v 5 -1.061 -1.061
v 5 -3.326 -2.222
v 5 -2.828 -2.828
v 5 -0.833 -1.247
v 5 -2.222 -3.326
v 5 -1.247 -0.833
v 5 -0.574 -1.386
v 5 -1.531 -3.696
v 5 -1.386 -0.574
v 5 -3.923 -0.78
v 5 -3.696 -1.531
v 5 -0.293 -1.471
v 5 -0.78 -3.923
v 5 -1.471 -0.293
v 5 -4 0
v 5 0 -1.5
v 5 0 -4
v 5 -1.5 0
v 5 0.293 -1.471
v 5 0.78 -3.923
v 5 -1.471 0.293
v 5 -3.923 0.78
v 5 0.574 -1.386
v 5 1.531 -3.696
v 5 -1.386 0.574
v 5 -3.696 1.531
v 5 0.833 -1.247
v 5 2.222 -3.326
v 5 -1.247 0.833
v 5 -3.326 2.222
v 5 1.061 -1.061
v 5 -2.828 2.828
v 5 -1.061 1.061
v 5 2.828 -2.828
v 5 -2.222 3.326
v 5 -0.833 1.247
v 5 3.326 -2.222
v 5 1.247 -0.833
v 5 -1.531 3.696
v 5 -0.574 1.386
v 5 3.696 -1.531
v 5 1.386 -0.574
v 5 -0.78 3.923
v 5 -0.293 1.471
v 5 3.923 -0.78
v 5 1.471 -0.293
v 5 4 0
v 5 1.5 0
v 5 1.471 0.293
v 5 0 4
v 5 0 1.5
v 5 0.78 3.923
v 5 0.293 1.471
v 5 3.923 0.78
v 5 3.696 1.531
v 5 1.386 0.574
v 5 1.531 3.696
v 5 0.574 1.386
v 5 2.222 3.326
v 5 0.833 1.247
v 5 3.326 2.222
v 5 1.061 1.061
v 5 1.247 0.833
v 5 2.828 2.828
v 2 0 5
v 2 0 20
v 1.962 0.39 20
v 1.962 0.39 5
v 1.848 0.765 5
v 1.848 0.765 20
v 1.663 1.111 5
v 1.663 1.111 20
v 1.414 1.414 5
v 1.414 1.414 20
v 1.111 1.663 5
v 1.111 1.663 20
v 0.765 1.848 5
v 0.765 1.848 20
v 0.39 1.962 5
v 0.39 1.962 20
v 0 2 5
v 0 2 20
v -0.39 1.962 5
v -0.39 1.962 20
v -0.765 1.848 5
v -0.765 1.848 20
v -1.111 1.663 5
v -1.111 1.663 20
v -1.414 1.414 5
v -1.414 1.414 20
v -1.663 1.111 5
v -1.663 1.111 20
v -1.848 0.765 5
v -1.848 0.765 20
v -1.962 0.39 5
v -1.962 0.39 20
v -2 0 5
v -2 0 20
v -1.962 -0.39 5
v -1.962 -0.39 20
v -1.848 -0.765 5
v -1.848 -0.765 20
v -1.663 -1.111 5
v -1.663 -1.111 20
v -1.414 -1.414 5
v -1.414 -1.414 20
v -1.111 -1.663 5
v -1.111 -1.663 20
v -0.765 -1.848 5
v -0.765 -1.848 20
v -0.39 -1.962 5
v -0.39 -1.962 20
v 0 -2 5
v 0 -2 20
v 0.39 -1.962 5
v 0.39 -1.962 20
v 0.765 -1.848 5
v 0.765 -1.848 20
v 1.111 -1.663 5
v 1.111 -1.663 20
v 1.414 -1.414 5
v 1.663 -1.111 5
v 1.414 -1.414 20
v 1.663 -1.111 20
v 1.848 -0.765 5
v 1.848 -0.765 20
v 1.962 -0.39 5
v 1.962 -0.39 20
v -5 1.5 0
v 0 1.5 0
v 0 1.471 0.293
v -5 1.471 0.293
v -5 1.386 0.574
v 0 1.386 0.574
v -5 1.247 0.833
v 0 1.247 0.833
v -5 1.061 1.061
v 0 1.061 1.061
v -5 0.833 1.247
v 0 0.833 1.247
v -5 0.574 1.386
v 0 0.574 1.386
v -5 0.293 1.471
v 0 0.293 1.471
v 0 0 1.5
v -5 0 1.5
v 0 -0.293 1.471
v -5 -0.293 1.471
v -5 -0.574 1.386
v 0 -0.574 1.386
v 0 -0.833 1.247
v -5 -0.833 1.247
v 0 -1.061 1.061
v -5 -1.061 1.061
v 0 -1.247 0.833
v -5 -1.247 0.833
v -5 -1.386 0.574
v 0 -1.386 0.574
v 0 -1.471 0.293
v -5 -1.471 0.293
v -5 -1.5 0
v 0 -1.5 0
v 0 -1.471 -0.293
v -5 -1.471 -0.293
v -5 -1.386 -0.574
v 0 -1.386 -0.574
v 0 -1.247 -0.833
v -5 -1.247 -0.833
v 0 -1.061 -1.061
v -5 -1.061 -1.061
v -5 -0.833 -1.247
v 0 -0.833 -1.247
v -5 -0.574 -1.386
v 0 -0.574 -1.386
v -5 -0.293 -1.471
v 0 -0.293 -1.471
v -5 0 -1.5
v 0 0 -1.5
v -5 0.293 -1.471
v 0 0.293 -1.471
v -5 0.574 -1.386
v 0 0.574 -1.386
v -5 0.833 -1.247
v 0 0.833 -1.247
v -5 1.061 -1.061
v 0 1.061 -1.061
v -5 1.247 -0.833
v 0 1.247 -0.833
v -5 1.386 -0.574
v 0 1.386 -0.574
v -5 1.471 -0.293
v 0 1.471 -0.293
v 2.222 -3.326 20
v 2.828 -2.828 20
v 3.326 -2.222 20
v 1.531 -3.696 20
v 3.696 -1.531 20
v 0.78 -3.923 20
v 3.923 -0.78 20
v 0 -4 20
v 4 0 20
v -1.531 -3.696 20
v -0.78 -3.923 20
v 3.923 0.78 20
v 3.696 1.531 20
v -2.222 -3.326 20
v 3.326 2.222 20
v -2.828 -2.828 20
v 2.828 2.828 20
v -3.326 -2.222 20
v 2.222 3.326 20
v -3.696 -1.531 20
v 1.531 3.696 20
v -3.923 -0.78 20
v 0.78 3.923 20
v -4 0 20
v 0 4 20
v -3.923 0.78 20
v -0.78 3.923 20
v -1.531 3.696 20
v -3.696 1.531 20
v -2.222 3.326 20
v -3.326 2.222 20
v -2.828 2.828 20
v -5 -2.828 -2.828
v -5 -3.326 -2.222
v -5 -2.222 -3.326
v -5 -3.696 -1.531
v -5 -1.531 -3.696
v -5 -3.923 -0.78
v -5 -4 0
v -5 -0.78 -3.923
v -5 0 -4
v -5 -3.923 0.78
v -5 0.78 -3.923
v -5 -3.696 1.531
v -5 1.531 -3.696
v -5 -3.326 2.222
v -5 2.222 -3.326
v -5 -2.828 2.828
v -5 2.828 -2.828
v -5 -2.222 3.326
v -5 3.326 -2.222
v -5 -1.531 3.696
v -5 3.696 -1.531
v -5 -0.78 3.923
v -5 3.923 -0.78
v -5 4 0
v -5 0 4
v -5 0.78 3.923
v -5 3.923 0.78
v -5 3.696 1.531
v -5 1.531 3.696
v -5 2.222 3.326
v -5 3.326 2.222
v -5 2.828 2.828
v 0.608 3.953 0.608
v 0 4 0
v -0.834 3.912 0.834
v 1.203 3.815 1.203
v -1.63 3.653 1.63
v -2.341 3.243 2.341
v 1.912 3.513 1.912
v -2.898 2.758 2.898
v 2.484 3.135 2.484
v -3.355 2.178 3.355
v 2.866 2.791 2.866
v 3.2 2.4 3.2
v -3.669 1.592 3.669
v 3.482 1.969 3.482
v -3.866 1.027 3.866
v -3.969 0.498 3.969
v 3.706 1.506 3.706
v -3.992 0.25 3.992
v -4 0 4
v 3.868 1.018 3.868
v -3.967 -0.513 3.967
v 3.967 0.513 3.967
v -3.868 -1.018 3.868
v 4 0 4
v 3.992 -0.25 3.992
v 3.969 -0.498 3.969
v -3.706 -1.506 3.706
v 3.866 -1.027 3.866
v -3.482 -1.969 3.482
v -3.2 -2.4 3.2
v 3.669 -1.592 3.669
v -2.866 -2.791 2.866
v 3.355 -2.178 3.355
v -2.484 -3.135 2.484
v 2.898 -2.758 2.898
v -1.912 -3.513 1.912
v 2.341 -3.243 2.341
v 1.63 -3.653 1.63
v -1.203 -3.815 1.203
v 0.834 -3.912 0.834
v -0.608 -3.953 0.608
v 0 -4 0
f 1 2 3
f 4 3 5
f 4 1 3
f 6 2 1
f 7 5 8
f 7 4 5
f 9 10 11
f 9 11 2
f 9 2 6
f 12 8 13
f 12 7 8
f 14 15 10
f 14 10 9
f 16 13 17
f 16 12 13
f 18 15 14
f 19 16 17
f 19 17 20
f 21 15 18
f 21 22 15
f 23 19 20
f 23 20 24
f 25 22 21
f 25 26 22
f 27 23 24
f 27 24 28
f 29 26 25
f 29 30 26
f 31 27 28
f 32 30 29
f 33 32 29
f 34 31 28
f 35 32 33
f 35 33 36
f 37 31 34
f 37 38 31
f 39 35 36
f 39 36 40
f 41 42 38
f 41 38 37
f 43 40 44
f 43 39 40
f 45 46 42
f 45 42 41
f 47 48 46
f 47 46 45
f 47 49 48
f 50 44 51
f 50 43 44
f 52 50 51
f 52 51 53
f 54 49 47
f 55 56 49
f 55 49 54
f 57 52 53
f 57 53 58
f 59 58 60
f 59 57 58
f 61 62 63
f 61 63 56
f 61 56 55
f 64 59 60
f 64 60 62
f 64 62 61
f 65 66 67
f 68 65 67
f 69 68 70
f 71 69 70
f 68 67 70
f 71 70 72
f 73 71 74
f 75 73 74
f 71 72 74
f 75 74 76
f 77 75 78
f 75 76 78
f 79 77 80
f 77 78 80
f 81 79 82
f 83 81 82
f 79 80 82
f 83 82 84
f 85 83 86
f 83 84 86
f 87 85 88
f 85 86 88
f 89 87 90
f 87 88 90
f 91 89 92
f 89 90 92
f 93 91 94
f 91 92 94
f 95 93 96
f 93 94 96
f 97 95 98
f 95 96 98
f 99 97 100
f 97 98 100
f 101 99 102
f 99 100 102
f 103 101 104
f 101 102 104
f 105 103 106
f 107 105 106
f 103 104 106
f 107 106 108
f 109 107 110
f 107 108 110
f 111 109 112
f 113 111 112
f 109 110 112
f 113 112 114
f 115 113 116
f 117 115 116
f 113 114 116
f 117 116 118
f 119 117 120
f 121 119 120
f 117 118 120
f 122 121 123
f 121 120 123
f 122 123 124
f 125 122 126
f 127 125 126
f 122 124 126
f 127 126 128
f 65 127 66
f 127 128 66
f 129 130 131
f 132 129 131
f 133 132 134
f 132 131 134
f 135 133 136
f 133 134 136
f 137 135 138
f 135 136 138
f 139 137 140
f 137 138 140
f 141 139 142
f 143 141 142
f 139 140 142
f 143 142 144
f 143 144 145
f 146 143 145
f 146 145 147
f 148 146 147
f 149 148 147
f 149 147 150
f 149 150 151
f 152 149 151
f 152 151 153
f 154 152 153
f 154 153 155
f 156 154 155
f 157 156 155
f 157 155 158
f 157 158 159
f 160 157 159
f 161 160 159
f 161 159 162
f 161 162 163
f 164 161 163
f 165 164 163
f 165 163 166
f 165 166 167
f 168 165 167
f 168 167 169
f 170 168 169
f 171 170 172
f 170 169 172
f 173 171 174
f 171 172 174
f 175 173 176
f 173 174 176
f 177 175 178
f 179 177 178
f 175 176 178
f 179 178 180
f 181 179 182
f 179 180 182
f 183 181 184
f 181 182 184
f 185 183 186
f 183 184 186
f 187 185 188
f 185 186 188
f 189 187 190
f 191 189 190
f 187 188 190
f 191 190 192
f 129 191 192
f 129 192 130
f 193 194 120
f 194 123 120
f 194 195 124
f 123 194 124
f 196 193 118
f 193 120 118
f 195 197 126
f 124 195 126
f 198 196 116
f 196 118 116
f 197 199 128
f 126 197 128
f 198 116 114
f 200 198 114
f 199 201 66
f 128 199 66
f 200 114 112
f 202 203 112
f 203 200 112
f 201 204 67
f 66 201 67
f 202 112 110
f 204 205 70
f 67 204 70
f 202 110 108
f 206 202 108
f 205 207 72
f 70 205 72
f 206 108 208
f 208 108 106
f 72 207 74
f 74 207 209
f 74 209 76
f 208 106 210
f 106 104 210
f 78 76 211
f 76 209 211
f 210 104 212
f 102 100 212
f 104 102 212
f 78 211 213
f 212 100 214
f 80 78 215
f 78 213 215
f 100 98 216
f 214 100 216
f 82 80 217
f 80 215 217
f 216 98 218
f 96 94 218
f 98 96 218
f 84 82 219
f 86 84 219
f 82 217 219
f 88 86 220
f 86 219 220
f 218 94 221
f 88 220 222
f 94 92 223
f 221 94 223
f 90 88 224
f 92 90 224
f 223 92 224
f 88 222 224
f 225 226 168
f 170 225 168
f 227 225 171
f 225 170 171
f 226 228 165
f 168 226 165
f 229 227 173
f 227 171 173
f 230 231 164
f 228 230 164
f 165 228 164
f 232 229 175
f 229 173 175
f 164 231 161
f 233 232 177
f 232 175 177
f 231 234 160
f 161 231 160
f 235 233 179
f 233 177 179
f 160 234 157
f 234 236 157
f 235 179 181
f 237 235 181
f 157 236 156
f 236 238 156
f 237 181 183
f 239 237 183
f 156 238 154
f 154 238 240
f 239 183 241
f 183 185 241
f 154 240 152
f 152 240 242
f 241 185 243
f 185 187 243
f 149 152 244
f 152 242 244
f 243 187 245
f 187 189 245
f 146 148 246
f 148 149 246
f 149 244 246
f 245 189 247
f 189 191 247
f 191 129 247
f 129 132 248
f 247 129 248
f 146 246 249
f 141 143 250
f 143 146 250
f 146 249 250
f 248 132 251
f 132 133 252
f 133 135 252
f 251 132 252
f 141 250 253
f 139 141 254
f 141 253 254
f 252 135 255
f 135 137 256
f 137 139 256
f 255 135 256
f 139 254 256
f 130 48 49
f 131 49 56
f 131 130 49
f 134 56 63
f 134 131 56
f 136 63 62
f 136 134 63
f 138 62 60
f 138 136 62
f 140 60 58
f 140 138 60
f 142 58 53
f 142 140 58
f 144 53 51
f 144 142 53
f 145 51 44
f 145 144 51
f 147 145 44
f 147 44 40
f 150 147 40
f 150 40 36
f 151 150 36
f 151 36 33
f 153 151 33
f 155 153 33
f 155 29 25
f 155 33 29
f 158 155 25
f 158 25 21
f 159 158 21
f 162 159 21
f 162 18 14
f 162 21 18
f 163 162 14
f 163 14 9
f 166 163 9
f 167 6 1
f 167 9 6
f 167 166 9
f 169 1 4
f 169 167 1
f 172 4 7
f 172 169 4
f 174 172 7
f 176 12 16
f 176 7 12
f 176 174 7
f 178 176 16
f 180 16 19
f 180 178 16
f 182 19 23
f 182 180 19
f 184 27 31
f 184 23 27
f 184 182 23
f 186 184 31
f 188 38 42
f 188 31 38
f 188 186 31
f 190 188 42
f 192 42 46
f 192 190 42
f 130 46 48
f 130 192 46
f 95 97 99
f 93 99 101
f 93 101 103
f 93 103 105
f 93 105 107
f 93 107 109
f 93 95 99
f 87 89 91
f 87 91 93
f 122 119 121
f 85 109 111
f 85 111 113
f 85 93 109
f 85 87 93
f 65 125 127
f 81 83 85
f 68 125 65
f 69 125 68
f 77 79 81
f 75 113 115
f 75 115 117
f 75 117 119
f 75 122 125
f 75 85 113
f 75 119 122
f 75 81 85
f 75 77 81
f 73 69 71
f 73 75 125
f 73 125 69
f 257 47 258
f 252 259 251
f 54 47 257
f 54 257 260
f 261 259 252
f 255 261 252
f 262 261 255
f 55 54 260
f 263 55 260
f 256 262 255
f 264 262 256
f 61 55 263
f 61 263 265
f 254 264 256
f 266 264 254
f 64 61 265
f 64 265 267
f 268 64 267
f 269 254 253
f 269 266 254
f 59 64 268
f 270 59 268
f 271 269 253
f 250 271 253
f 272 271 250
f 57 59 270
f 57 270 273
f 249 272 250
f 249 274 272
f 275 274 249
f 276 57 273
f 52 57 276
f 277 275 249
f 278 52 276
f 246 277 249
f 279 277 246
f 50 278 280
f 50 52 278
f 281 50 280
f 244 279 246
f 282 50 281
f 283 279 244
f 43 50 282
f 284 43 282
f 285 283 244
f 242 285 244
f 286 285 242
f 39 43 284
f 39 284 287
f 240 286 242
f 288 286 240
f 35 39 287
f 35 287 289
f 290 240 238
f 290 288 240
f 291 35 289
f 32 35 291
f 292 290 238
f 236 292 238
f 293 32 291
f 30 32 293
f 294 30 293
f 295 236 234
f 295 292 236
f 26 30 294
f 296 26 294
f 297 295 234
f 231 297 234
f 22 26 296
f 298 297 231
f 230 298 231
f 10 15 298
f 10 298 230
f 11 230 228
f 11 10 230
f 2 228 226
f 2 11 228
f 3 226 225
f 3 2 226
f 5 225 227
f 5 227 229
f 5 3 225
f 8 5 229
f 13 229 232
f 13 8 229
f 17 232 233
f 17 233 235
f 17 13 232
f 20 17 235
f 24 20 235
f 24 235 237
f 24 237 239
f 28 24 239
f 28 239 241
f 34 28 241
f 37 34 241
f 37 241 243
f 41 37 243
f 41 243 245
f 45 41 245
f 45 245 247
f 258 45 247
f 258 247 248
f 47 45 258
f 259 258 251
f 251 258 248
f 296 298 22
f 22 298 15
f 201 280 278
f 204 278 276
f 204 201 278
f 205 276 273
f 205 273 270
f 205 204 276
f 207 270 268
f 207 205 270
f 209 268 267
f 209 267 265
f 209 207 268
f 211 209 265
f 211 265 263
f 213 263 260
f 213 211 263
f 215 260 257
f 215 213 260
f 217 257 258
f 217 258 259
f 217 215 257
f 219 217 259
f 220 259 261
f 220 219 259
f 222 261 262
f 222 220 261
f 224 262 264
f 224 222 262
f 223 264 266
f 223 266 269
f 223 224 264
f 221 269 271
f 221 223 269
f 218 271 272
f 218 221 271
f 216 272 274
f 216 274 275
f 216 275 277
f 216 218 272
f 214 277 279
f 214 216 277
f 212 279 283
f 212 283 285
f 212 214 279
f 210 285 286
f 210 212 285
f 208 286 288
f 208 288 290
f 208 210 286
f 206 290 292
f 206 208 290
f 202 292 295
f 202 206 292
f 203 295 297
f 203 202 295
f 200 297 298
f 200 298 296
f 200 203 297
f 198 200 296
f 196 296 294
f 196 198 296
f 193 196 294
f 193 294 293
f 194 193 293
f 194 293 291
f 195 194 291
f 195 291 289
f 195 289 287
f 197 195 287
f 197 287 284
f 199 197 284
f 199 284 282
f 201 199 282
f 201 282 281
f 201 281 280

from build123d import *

# Parameters (mm, degrees)
SKETCH_W          = 4
SKETCH_H          = 20
SKETCH001_R       = 4
PAD_DEPTH         = 5
SKETCH002_R       = 1.5
POCKET_DEPTH      = 5.001
POCKET_DEPTH_BACK = -5.001
SKETCH003_R       = 2
POCKET001_DEPTH   = 15


with BuildPart() as part:
    # Sketch (on DatumPlane) → Revolution (revolve)
    with BuildSketch(Plane.XZ):
        with Locations((2, 10)):
            Rectangle(SKETCH_W, SKETCH_H)
    revolve(axis=Axis((0, 0, 0), (0, 0, 1)))

    # Sketch001 (on DatumPlane) → Pad (new body, symmetric)
    with BuildSketch(Plane.YZ):
        Circle(SKETCH001_R)
    extrude(amount=PAD_DEPTH, both=True)

    # Sketch002 (on DatumPlane) → Pocket (cut, two sides)
    with BuildSketch(Plane.YZ) as pocket_sk:
        Circle(SKETCH002_R)
    extrude(amount=-POCKET_DEPTH, mode=Mode.SUBTRACT)
    extrude(pocket_sk.sketch, amount=-POCKET_DEPTH_BACK, mode=Mode.SUBTRACT)

    # Sketch003 (on DatumPlane) → Pocket001 (cut)
    with BuildSketch(Plane.XY.offset(20)):
        Circle(SKETCH003_R)
    extrude(amount=-POCKET001_DEPTH, mode=Mode.SUBTRACT)


solid = part.part
